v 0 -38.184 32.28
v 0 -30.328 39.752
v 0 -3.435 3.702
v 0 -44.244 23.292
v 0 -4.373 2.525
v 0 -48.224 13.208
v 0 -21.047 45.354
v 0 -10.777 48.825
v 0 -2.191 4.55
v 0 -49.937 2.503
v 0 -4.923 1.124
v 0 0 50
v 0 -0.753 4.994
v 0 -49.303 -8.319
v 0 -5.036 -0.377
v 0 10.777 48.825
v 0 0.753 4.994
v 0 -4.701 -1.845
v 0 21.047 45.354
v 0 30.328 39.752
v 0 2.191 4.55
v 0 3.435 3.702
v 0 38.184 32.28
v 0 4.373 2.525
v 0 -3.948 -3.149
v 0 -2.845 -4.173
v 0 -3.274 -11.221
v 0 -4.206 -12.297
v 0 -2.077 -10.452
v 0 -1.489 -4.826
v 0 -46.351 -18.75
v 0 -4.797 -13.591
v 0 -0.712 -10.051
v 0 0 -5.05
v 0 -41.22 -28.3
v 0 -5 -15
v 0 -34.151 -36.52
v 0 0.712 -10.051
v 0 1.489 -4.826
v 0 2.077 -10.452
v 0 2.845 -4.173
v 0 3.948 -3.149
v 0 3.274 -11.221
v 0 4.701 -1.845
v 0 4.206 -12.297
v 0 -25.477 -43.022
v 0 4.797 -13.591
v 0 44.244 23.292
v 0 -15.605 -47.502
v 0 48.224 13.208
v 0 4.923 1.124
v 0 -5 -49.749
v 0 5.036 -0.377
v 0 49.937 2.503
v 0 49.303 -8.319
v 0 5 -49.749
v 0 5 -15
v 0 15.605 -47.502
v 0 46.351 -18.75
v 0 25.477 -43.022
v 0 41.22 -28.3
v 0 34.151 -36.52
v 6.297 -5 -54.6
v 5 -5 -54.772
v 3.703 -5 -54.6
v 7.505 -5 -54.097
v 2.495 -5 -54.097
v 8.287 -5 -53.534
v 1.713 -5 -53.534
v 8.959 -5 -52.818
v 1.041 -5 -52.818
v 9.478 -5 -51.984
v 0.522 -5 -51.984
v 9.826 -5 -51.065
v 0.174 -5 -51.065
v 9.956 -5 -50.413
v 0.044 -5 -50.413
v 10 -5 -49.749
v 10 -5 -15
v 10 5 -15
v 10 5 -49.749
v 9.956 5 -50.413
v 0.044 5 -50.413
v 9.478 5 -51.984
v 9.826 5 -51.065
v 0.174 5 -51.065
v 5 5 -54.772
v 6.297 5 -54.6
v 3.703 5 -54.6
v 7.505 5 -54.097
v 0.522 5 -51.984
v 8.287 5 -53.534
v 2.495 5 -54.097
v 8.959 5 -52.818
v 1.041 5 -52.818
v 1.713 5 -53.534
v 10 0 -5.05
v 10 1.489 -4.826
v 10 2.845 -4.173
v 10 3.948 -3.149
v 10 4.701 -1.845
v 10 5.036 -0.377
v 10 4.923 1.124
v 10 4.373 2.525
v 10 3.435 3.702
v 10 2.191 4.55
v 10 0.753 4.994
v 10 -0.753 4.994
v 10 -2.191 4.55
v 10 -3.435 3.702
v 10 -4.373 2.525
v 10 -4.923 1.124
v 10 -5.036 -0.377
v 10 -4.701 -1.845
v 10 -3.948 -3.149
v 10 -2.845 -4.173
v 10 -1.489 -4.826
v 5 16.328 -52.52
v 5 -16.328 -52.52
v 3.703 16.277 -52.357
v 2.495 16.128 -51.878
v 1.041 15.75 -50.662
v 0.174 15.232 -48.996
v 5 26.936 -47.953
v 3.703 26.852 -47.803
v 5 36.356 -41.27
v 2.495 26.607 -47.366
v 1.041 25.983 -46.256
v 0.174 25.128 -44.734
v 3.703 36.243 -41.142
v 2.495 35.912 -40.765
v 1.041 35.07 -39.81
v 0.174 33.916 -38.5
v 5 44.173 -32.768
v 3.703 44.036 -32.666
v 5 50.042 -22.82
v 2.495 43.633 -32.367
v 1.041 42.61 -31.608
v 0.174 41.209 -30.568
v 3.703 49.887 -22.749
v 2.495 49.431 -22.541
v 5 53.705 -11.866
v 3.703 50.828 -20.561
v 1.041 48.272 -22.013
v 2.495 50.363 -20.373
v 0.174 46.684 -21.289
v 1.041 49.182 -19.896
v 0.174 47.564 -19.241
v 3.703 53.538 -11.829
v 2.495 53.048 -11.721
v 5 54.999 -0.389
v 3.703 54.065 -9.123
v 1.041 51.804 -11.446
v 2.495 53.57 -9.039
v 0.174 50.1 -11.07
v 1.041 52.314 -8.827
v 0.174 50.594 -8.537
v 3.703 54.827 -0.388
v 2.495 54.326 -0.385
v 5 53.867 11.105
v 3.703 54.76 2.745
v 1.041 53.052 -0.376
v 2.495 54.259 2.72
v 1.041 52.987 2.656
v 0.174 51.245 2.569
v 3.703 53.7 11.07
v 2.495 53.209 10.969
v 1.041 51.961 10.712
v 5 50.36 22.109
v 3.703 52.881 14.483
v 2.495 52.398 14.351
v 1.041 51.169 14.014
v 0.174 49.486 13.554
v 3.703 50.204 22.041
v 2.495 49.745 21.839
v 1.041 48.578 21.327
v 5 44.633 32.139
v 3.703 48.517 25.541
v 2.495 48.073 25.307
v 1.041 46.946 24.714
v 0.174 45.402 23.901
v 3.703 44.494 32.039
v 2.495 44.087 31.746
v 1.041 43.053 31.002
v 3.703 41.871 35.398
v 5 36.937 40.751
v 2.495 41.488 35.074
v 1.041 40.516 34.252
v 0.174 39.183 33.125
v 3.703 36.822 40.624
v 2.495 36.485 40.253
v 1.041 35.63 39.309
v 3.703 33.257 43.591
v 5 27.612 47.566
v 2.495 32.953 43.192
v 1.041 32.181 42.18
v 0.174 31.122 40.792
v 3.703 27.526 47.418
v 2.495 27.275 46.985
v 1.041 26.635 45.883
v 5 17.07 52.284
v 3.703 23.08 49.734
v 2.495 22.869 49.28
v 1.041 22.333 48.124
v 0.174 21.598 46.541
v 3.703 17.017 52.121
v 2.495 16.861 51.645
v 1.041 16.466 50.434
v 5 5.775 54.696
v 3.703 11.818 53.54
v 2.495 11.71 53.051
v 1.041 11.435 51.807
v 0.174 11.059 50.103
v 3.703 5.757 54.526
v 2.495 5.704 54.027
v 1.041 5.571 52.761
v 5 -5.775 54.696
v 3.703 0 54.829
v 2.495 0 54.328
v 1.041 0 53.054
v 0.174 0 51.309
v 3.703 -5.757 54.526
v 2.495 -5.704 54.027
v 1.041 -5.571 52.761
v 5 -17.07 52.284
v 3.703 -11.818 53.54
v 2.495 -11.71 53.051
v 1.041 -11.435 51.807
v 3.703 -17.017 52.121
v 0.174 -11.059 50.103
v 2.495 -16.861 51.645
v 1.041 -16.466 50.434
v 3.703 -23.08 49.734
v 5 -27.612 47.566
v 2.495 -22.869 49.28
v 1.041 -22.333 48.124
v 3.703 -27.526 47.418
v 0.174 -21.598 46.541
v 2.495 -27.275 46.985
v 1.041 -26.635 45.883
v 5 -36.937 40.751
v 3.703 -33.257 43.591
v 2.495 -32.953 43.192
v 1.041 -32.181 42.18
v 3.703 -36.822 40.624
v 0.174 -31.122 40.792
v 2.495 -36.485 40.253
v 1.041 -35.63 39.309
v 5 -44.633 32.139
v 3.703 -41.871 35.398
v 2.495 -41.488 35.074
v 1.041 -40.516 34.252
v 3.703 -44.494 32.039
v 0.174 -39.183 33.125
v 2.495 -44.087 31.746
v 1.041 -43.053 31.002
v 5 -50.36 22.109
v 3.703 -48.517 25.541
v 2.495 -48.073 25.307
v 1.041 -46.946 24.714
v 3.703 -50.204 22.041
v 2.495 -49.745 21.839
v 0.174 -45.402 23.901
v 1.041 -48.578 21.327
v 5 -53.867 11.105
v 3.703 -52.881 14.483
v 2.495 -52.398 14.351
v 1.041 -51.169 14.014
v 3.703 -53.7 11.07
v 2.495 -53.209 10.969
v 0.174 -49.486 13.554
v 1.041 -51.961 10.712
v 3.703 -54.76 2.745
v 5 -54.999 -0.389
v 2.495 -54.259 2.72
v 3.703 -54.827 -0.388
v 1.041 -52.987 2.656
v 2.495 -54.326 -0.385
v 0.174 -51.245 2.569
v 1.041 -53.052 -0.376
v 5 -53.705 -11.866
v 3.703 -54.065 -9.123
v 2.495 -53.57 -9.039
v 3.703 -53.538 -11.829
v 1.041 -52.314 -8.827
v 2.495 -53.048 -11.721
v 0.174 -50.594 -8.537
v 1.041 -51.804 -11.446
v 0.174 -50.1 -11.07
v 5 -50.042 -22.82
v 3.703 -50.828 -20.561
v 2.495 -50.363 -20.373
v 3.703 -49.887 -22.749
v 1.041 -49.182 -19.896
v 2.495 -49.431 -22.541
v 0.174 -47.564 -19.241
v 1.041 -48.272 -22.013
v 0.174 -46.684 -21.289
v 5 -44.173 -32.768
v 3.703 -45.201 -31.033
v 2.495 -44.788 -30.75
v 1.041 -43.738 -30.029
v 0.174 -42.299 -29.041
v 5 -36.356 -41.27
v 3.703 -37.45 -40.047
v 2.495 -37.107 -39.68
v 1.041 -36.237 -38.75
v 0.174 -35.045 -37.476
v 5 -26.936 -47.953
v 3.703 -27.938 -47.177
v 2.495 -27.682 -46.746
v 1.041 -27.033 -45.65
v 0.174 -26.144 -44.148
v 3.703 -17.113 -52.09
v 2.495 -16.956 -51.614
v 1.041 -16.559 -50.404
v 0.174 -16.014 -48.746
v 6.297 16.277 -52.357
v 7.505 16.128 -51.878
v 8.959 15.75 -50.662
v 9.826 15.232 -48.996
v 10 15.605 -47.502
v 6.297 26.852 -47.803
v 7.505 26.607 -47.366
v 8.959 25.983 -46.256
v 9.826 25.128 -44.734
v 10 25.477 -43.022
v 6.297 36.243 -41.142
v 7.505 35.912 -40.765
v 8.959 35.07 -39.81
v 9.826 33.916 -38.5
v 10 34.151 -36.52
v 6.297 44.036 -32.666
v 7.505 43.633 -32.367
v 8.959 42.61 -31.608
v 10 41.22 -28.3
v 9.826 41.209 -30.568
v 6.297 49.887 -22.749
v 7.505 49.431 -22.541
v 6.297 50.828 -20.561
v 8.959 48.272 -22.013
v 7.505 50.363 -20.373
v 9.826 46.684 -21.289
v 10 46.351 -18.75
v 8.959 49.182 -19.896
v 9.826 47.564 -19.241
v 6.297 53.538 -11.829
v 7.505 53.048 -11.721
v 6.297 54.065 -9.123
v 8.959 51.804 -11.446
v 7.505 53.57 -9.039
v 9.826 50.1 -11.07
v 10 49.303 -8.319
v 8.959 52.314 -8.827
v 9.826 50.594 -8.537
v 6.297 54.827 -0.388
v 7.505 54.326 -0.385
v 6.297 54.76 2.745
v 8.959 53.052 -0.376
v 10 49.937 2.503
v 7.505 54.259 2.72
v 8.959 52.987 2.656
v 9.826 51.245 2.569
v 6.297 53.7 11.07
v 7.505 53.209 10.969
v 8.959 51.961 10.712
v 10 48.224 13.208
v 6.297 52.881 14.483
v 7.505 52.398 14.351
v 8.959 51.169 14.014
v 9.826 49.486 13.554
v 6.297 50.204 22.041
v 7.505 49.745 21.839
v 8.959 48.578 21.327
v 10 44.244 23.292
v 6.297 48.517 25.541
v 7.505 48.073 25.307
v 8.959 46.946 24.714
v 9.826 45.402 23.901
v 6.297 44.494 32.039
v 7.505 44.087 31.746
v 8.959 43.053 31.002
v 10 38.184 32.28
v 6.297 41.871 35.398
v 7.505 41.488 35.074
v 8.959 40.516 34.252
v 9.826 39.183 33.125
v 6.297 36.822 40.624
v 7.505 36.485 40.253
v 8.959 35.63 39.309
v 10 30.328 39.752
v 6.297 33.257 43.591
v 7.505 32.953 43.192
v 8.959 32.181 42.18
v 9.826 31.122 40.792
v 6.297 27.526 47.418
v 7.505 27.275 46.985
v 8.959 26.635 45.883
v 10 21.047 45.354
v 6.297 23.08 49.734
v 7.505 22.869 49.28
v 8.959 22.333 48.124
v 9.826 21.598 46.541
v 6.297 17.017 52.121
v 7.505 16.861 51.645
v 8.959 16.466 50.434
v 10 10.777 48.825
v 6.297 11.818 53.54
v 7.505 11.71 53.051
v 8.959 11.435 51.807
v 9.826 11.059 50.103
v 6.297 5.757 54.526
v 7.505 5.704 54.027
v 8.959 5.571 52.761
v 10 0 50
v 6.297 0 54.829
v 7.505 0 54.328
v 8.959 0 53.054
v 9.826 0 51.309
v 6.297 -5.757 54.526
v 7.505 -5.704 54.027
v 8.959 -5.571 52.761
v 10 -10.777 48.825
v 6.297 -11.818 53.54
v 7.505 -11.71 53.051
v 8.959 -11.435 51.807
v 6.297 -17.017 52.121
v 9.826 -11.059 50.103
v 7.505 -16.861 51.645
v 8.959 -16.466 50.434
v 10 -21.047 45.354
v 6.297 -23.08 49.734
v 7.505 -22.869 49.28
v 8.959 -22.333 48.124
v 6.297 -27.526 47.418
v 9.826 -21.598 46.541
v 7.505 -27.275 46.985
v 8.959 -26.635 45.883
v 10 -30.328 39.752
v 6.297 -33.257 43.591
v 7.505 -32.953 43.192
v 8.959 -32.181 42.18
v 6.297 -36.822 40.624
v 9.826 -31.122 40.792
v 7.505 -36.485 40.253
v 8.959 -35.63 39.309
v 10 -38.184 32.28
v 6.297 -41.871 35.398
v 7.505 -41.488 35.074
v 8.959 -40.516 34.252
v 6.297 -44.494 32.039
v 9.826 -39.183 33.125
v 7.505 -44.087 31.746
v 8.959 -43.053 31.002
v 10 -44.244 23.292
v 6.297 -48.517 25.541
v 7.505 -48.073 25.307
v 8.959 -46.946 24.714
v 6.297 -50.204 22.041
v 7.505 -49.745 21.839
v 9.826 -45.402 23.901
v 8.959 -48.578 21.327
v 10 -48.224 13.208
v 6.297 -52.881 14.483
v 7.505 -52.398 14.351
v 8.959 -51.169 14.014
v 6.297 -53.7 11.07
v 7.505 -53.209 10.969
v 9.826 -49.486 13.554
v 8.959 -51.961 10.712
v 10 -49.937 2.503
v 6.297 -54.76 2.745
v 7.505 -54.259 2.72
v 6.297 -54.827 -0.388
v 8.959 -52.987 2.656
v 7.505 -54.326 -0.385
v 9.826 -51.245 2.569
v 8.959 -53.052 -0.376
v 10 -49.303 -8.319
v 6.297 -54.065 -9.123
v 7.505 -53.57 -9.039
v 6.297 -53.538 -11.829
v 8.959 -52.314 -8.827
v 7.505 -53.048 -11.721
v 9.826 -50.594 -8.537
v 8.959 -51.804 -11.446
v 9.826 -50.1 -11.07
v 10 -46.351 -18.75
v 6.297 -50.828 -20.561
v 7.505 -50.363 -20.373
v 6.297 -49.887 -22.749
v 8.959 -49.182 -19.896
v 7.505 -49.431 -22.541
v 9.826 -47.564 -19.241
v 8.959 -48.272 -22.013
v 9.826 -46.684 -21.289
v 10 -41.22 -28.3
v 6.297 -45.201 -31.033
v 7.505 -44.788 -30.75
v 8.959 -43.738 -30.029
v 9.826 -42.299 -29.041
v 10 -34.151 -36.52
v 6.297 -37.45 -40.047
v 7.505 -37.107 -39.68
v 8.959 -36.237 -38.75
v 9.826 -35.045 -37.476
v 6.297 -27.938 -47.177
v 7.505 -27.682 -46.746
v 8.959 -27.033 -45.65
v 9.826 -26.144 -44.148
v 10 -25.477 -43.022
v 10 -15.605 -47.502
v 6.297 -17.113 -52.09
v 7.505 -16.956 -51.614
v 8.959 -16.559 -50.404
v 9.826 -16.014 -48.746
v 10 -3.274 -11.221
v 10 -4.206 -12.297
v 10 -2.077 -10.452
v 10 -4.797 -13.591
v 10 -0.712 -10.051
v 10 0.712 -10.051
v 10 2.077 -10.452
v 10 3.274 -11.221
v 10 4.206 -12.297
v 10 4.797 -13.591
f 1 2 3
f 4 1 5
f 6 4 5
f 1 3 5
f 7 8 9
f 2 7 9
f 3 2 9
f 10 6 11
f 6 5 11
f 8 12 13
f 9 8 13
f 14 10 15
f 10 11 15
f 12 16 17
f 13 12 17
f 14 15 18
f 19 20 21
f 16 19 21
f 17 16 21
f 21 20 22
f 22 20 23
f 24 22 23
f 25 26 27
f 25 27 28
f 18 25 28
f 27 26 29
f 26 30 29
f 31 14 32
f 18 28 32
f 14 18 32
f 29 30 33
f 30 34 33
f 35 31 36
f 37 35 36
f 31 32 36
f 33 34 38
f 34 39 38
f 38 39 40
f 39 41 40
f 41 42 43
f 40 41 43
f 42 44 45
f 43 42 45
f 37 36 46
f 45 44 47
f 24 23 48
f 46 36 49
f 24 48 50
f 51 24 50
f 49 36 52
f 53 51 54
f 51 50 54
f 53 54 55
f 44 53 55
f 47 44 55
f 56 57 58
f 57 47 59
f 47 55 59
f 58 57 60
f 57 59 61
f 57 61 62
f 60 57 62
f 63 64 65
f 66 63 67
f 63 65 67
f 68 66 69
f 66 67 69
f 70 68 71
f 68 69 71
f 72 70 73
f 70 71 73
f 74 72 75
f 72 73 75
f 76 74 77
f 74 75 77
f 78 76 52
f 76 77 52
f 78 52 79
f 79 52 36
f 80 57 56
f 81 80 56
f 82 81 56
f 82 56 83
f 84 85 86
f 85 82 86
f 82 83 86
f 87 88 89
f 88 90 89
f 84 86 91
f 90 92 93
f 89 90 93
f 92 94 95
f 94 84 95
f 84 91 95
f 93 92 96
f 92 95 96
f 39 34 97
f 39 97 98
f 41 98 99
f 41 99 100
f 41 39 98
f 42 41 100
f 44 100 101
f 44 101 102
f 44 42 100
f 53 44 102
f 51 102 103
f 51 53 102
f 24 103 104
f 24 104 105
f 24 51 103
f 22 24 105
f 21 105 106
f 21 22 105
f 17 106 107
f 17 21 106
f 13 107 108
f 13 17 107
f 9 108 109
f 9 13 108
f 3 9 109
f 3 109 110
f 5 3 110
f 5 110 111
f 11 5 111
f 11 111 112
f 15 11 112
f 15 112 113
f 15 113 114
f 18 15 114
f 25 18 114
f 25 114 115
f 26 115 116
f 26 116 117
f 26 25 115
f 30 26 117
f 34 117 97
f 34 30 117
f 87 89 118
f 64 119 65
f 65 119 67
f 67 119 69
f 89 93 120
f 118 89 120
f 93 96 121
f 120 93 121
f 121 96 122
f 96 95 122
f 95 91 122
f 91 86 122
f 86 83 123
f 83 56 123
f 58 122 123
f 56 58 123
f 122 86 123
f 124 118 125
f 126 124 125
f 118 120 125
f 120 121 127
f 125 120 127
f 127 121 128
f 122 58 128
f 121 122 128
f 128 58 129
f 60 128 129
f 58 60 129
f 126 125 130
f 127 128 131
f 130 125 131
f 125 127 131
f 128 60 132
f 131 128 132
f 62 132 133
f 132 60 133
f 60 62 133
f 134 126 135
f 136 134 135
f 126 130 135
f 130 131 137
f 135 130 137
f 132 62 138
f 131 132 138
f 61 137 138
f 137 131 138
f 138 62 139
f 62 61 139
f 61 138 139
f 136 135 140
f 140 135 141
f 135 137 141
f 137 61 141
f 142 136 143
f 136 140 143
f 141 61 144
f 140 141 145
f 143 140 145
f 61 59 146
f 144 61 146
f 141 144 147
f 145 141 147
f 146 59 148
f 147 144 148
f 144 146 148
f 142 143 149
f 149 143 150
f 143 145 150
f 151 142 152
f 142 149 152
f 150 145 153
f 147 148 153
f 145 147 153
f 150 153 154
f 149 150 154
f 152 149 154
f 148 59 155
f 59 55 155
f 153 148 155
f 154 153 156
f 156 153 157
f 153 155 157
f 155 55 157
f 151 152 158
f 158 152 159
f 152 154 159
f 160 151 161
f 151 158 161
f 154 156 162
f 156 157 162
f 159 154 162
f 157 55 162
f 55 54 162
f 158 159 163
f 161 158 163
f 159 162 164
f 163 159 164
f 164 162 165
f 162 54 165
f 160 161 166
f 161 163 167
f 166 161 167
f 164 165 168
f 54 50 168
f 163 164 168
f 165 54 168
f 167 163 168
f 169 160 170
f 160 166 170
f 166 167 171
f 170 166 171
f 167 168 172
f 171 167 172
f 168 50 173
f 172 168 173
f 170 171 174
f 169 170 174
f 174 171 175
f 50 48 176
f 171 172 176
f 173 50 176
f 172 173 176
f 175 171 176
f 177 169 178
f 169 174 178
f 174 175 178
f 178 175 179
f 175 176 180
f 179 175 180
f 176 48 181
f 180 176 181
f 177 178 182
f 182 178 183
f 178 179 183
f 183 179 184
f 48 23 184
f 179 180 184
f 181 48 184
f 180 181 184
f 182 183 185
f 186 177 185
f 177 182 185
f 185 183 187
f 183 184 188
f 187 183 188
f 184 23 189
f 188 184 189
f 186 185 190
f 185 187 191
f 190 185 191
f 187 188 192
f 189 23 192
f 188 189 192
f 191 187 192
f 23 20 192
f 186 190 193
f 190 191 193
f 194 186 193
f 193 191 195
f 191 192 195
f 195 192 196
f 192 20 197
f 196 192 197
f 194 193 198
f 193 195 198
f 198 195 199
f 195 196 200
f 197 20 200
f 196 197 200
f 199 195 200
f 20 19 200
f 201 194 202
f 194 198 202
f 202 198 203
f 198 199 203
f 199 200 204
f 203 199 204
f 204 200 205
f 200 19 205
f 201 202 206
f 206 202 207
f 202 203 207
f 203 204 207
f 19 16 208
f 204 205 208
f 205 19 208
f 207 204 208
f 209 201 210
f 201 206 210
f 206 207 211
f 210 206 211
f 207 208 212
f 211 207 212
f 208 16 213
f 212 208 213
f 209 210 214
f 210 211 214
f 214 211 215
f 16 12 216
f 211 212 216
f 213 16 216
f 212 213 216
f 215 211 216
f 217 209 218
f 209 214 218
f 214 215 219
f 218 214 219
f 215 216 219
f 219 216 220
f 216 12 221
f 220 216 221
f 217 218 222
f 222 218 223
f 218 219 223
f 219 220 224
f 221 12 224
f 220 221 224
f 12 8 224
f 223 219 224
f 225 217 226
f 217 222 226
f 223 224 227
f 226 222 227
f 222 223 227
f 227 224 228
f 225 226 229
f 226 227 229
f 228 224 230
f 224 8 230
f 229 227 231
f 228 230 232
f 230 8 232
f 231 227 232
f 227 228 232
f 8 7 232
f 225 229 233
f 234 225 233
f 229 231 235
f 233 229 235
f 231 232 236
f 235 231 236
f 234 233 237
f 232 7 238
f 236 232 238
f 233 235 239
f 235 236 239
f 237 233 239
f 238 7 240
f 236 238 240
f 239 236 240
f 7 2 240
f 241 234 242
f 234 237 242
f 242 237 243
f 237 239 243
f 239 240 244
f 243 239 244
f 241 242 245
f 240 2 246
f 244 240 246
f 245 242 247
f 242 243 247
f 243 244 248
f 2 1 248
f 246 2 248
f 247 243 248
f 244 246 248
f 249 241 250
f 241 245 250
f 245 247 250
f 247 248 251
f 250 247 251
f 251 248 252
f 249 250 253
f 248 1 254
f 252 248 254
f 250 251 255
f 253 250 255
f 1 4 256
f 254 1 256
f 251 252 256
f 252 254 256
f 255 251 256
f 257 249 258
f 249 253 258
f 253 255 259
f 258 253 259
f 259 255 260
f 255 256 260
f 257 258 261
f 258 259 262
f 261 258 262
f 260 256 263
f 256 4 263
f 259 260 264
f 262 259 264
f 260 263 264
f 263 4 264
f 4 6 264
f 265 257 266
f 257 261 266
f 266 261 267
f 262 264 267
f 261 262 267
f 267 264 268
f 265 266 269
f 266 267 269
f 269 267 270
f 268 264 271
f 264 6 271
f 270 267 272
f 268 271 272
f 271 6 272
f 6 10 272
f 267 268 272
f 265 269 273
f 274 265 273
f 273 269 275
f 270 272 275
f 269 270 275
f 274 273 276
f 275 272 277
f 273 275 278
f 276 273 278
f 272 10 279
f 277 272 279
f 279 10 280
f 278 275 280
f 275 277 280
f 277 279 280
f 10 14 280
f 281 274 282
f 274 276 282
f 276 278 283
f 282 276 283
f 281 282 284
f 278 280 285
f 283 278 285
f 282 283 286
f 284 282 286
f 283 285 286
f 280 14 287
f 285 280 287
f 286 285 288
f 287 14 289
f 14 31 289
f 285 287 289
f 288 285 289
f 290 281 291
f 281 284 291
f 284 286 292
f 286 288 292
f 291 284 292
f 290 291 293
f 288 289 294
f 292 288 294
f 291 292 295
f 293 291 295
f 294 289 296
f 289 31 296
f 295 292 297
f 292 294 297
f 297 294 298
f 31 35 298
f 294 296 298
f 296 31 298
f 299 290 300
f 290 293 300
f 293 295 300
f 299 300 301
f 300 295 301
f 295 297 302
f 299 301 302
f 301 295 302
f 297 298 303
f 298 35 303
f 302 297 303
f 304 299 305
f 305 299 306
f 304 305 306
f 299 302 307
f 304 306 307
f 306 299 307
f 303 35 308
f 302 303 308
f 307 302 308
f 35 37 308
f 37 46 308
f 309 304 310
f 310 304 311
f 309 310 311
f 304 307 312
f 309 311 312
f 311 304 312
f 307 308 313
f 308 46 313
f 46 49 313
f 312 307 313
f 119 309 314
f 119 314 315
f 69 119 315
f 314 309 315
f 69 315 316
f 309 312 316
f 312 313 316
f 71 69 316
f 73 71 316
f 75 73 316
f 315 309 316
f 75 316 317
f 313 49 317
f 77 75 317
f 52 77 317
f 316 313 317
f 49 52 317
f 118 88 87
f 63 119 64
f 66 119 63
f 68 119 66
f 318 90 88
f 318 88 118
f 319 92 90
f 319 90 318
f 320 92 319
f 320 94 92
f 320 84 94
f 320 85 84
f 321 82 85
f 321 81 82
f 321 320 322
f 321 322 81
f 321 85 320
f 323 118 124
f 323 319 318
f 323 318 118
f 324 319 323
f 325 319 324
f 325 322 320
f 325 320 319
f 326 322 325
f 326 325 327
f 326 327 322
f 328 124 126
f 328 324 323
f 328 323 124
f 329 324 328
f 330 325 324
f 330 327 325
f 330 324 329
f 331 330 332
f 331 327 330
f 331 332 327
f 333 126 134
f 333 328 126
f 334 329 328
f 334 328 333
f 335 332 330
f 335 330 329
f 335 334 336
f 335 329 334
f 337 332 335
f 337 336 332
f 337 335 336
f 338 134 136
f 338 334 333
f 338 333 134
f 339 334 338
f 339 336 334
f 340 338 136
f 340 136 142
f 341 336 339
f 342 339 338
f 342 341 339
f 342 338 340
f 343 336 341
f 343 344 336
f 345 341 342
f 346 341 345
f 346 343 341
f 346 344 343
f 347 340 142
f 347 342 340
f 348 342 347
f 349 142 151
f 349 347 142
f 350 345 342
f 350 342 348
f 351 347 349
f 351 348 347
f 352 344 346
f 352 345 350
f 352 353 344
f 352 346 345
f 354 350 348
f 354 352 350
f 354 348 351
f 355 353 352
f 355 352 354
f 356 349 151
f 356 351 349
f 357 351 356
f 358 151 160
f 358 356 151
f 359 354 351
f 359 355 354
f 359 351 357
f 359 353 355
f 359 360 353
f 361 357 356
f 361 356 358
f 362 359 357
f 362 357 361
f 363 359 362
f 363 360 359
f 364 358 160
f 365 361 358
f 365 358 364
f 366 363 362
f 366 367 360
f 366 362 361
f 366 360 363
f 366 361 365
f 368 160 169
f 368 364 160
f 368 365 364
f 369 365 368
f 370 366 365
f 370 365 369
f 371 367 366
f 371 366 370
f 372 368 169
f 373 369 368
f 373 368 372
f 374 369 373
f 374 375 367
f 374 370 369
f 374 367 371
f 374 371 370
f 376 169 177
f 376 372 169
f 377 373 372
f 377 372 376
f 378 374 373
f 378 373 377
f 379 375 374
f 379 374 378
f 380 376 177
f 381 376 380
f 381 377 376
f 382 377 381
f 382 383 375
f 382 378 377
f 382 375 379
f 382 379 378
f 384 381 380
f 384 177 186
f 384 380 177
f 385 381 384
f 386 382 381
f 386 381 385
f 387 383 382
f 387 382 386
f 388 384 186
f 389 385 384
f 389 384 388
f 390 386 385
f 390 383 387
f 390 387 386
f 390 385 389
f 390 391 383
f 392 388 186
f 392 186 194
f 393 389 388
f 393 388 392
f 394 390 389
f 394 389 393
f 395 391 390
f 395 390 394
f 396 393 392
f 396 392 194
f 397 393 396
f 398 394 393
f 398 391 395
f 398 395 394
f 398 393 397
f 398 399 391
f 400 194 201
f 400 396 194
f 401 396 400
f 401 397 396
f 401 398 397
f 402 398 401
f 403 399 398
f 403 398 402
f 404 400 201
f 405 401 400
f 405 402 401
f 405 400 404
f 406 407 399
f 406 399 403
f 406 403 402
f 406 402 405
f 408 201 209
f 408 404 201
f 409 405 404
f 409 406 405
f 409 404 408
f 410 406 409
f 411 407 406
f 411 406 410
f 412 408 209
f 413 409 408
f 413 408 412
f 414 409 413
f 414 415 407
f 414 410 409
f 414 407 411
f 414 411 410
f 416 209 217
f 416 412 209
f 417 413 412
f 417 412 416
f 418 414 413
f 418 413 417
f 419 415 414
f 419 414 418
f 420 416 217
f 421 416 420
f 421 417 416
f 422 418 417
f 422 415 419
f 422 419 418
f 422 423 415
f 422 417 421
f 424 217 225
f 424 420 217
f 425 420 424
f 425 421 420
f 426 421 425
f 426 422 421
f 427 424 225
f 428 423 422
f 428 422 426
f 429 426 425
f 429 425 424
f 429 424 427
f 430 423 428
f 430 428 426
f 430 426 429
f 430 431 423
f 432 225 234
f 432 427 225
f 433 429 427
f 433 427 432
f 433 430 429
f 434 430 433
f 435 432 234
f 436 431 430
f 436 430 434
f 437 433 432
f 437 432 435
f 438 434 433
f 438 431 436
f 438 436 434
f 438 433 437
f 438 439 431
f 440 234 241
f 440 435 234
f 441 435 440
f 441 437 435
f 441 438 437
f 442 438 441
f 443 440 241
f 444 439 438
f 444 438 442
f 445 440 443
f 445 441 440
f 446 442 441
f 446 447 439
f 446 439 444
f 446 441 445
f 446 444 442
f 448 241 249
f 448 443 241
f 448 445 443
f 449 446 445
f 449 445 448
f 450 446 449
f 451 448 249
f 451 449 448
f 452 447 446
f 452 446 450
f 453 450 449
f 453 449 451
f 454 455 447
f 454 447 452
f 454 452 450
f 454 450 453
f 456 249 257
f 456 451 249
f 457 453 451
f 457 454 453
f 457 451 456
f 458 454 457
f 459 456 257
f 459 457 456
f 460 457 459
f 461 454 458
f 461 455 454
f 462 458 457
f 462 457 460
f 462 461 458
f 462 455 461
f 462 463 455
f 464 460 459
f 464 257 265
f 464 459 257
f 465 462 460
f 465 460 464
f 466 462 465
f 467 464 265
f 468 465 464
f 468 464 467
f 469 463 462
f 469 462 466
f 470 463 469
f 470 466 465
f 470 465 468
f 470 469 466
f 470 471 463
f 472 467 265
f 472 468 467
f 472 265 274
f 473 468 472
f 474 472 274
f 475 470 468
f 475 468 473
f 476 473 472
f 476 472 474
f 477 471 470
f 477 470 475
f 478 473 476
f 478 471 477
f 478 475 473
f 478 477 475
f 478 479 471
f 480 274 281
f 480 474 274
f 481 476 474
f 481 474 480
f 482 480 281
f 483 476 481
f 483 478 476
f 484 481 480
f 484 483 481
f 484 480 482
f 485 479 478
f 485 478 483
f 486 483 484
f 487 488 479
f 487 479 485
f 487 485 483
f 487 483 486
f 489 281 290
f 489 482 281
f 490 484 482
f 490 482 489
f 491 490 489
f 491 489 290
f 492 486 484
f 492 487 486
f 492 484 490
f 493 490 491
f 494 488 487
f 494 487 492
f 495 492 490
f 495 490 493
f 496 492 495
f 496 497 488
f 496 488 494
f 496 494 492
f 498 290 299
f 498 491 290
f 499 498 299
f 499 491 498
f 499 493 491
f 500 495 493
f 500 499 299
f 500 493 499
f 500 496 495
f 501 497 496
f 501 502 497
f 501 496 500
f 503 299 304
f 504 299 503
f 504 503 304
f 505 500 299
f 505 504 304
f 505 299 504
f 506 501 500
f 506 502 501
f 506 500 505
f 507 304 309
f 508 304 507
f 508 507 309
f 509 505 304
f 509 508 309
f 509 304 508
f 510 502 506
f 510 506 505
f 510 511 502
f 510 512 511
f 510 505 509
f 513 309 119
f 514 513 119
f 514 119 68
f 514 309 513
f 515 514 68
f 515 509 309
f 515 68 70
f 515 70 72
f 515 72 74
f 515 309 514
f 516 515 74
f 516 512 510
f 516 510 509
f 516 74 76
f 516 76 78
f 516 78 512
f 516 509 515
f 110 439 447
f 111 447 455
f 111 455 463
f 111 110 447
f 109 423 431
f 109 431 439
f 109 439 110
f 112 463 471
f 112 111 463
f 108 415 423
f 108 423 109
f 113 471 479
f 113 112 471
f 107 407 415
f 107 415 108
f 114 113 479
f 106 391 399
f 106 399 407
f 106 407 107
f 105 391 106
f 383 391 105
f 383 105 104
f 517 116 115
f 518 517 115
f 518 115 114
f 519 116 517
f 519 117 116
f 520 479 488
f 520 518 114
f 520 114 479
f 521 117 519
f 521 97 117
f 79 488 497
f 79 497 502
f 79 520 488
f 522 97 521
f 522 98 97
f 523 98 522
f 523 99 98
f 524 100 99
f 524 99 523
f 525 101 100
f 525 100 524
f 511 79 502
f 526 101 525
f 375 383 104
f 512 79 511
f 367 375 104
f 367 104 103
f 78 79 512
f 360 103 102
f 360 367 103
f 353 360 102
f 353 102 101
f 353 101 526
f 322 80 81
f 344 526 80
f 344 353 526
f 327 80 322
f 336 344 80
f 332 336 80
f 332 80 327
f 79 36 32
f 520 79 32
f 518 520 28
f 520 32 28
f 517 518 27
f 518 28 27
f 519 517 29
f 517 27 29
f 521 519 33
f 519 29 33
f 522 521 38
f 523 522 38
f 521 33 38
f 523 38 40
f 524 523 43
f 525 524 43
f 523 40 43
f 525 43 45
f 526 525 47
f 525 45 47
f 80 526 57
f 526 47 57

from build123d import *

# Parameters (mm, degrees)
SKETCH1_R           = 110
BOSS_EXTRUDE1_DEPTH = 20
CUT_EXTRUDE2_DEPTH  = 20
SKETCH2_R           = 10.1
CUT_EXTRUDE3_DEPTH  = 20
FILLET1_R           = 10
SCALE1_SCALE        = 0.5


with BuildPart() as part:
    # Sketch1 → Boss-Extrude1 (new body)
    with BuildSketch(Plane(origin=(0, 0, 0), x_dir=(0, 0, -1), z_dir=(1, 0, 0))):
        Circle(SKETCH1_R)
    extrude(amount=BOSS_EXTRUDE1_DEPTH)

    # Sketch3 → Cut-Extrude2 (cut)
    with BuildSketch(Plane(origin=(0, 0, 0), x_dir=(0, 0, -1), z_dir=(1, 0, 0))):
        with BuildLine():
            Line((113.492219185, -10), (30, -10))
            ThreePointArc((30, -10), (20, 0), (30, 10))
            Line((30, 10), (113.492219185, 10))
            ThreePointArc((113.492219185, 10), (123.492219185, 0), (113.492219185, -10))
        make_face()
    extrude(amount=CUT_EXTRUDE2_DEPTH, mode=Mode.SUBTRACT)

    # Sketch2 → Cut-Extrude3 (cut)
    with BuildSketch(Plane(origin=(0, 0, 0), x_dir=(0, 0, -1), z_dir=(1, 0, 0))):
        Circle(SKETCH2_R)
    extrude(amount=CUT_EXTRUDE3_DEPTH, mode=Mode.SUBTRACT)

    # Fillet1
    fillet1_edges = [part.edges().sort_by_distance(p)[0] for p in [
        (20, 0, 110),
        (0, 0, 110),
    ]]
    fillet(fillet1_edges, radius=FILLET1_R - 0.0001)  # a hair under: the kernel refuses the full size


with BuildPart() as part_1:
    # Scale1: scaled about (0, 0, 0)
    add(part.part.scale(SCALE1_SCALE))


solid = part_1.part
